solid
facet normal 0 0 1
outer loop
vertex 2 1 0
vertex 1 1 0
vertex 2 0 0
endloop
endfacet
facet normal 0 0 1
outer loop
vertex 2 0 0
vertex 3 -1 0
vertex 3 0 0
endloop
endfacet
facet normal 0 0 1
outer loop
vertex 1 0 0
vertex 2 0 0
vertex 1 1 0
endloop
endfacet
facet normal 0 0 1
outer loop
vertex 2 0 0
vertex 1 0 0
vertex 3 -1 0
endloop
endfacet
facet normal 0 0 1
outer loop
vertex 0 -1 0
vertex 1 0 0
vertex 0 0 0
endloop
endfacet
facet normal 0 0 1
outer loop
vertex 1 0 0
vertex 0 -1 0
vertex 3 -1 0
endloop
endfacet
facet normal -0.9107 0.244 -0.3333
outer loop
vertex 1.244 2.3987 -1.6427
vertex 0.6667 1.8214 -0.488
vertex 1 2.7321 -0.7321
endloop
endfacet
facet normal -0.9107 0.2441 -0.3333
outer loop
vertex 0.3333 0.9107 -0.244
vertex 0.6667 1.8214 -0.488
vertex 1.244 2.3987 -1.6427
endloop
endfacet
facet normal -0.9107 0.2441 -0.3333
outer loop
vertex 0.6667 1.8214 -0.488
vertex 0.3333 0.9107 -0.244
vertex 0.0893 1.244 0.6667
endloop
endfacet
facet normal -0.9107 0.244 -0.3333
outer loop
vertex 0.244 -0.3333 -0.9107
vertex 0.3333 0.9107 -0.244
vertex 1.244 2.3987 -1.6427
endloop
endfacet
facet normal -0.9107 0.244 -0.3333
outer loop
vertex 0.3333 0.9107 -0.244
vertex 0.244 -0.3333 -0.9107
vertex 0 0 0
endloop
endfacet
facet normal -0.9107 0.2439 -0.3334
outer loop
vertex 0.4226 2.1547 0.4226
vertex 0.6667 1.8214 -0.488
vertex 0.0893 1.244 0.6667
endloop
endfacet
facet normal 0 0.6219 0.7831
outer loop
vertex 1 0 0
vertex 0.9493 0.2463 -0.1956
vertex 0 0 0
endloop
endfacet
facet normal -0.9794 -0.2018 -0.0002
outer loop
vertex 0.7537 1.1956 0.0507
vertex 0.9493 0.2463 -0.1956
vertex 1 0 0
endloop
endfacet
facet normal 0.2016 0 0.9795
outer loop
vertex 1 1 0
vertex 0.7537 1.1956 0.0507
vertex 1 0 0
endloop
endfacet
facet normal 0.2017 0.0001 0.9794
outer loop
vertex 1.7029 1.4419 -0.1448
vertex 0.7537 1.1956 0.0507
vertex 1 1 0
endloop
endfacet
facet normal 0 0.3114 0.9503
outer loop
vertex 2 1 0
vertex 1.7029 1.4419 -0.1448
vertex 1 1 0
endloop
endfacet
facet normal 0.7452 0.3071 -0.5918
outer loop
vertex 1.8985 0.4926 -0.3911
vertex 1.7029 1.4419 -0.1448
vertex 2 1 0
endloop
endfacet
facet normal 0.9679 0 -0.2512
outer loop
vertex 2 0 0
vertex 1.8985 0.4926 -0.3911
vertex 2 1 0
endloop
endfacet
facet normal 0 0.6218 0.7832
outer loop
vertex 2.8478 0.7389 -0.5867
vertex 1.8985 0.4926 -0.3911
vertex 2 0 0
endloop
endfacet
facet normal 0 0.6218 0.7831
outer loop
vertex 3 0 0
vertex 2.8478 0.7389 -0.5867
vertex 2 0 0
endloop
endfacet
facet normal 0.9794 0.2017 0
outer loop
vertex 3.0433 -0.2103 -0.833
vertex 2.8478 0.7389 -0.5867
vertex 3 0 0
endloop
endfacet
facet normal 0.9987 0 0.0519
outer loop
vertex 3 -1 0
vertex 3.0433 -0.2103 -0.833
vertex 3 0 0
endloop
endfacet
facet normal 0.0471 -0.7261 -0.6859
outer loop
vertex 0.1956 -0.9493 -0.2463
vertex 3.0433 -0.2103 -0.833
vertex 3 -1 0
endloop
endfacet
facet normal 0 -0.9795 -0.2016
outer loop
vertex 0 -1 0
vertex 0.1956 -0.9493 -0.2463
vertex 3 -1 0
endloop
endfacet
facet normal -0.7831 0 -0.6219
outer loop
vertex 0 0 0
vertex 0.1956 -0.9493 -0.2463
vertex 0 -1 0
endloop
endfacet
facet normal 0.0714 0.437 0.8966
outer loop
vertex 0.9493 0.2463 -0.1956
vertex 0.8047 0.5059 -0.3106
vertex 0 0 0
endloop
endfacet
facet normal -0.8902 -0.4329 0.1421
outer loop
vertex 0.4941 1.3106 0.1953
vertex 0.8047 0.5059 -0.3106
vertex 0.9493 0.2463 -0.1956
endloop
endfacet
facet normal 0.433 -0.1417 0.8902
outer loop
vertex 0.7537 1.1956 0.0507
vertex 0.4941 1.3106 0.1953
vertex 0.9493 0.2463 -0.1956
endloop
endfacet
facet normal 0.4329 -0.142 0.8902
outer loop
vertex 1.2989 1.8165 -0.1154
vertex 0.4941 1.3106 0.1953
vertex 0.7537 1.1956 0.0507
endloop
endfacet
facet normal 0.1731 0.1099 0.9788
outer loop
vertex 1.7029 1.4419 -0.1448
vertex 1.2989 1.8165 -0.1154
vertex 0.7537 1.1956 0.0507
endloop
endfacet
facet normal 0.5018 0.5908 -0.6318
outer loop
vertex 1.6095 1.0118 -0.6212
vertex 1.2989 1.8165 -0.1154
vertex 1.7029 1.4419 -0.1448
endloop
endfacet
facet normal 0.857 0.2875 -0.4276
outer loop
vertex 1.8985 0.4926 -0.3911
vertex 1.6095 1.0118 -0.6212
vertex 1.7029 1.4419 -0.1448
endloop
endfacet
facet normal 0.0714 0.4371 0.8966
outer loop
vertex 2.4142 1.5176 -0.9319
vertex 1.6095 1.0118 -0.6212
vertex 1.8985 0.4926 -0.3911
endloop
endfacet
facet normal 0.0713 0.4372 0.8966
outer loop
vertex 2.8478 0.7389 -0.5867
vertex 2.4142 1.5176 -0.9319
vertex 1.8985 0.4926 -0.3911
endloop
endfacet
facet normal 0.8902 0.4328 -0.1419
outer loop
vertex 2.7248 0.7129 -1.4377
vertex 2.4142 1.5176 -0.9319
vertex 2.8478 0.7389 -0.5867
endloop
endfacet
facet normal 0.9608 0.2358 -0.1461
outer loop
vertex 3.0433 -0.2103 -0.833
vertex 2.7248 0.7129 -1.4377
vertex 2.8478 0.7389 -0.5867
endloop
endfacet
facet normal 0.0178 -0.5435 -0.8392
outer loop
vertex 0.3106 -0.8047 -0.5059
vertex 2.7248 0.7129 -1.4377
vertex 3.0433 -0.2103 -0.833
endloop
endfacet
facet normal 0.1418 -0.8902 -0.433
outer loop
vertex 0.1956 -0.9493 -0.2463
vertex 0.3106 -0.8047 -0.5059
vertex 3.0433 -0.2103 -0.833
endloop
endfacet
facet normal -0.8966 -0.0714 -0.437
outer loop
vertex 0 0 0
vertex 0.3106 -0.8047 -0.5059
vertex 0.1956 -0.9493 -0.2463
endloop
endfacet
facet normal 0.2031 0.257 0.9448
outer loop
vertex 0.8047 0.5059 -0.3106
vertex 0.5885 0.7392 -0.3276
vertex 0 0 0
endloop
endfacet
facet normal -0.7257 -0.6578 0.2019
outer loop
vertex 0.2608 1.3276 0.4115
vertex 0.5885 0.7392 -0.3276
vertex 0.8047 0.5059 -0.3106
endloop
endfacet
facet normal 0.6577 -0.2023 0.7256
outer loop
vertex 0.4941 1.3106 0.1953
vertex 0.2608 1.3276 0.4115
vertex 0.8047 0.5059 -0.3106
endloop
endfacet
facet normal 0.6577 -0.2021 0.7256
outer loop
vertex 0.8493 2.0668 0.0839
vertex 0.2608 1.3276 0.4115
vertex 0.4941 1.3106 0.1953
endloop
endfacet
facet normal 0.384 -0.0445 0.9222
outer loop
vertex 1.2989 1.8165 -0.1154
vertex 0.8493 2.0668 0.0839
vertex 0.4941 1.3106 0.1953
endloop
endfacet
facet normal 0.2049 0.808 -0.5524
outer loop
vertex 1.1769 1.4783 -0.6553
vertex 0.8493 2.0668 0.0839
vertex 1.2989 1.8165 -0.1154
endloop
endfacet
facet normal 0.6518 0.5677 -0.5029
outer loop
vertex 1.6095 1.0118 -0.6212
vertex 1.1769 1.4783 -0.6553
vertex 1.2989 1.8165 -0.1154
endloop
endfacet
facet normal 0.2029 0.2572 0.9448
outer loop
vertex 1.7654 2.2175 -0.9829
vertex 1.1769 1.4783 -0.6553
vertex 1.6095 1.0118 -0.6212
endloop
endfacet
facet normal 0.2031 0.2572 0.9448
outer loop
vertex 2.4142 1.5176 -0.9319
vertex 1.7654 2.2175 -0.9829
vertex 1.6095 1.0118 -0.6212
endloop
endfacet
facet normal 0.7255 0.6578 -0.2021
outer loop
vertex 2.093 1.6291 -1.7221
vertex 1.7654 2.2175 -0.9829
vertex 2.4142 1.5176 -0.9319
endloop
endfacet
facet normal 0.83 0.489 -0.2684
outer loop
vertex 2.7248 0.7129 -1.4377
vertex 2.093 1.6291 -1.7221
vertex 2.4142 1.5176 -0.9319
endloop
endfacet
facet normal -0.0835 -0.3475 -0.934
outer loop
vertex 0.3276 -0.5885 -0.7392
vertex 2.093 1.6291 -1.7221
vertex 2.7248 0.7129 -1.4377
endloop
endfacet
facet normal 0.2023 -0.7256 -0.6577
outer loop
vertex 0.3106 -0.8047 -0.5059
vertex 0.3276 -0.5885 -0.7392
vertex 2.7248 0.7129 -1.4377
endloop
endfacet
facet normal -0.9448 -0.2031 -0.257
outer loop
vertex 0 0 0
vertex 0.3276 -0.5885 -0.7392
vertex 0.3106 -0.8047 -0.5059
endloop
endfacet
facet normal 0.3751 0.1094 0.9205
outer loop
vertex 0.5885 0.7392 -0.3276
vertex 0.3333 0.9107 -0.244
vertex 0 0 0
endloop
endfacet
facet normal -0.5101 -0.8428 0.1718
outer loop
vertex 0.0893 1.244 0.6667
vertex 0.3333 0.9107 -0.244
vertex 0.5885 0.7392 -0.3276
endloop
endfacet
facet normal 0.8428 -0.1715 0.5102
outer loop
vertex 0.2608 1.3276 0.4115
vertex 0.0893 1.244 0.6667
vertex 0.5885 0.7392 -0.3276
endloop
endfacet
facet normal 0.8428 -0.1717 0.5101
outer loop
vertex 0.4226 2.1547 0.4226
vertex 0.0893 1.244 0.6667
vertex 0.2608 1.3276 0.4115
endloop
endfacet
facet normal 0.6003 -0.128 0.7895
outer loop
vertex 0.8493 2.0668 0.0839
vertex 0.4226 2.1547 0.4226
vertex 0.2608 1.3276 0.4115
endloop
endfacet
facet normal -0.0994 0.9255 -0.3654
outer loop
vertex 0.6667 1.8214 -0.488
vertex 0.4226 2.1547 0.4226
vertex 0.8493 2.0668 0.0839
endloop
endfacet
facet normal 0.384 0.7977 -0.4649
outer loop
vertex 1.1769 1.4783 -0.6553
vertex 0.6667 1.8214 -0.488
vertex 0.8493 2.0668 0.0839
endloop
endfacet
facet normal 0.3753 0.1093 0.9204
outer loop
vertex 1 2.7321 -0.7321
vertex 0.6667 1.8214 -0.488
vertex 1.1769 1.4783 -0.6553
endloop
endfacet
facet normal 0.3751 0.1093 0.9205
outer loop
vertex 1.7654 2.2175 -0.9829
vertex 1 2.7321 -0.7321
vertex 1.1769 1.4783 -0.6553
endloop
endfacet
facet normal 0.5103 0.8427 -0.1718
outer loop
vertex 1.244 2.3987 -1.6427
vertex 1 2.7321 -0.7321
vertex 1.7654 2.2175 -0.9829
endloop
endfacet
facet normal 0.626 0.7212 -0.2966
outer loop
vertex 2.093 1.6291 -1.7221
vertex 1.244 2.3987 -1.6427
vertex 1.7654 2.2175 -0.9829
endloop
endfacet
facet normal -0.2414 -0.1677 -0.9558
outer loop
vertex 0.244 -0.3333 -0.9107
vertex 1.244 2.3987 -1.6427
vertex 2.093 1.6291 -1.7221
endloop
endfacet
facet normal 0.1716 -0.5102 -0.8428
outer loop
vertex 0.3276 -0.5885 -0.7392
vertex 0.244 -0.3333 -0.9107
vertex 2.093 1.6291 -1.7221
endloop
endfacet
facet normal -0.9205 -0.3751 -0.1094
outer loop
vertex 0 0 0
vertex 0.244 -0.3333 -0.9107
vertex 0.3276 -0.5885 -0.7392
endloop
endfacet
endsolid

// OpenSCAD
polyhedron(points=[
[0, 0],
[1, 0],
[1, 1],
[2, 1],
[2, 0],
[3, 0],
[3, -1],
[0, -1],
[0.0, 0.0, 0.0],
[0.9492530216741901, 0.24631587185329806, -0.19556889352748996],
[0.7536841281467002, 1.19556889352749, 0.05074697832580988],
[1.702937149820892, 1.441884765380788, -0.14482191520168008],
[1.898506043348382, 0.4926317437065979, -0.3911377870549799],
[2.847759065022572, 0.7389476155598977, -0.5867066805824699],
[3.043327958550062, -0.21030540611429416, -0.8330225524357697],
[0.19556889352748996, -0.9492530216741919, -0.24631587185329984],
[0.0, 0.0, -1.7763568394002505e-15],
[0.8047378541243653, 0.5058793634016787, -0.31061721752604754],
[0.4941206365983195, 1.310617217526044, 0.19526214587563473],
[1.2988584907226848, 1.8164965809277263, -0.11535507165040926],
[1.6094757082487305, 1.011758726803361, -0.6212344350520915],
[2.414213562373096, 1.5176380902050415, -0.9318516525781391],
[2.72483077989914, 0.712900236080678, -1.4377310159798178],
[0.310617217526044, -0.8047378541243653, -0.5058793634016805],
[0.0, 0.0, 0.0],
[0.5884556215767276, 0.7391742860058148, -0.3276299075825406],
[0.26082571399418697, 1.3276299075825406, 0.4115443784232742],
[0.8492813355709128, 2.0668041935883537, 0.08391447084073356],
[1.1769112431534534, 1.4783485720116278, -0.6552598151650812],
[1.7653668647301792, 2.2175228580174426, -0.9828897227476219],
[2.09299677231272, 1.629067236440715, -1.722064008753435],
[0.3276299075825406, -0.5884556215767258, -0.739174286005813],
[0.0, 0.0, -1.7763568394002505e-15],
[0.33333333333333215, 0.9106836025229583, -0.24401693585629403],
[0.0893163974770399, 1.2440169358562922, 0.6666666666666679],
[0.4226497308103738, 2.1547005383792506, 0.4226497308103756],
[0.6666666666666661, 1.8213672050459166, -0.4880338717125863],
[1.0, 2.732050807568875, -0.7320508075688785],
[1.2440169358562905, 2.398717474235543, -1.6427344100918368],
[0.24401693585629047, -0.3333333333333339, -0.9106836025229601],
], faces=[
[0, 1, 2, 3, 4, 5, 6, 7],
[39, 38, 37, 36, 35, 34, 33, 32],
[0, 8, 9],
[0, 9, 1],
[1, 9, 10],
[1, 10, 2],
[2, 10, 11],
[2, 11, 3],
[3, 11, 12],
[3, 12, 4],
[4, 12, 13],
[4, 13, 5],
[5, 13, 14],
[5, 14, 6],
[6, 14, 15],
[6, 15, 7],
[7, 15, 8],
[7, 8, 0],
[8, 16, 17],
[8, 17, 9],
[9, 17, 18],
[9, 18, 10],
[10, 18, 19],
[10, 19, 11],
[11, 19, 20],
[11, 20, 12],
[12, 20, 21],
[12, 21, 13],
[13, 21, 22],
[13, 22, 14],
[14, 22, 23],
[14, 23, 15],
[15, 23, 16],
[15, 16, 8],
[16, 24, 25],
[16, 25, 17],
[17, 25, 26],
[17, 26, 18],
[18, 26, 27],
[18, 27, 19],
[19, 27, 28],
[19, 28, 20],
[20, 28, 29],
[20, 29, 21],
[21, 29, 30],
[21, 30, 22],
[22, 30, 31],
[22, 31, 23],
[23, 31, 24],
[23, 24, 16],
[24, 32, 33],
[24, 33, 25],
[25, 33, 34],
[25, 34, 26],
[26, 34, 35],
[26, 35, 27],
[27, 35, 36],
[27, 36, 28],
[28, 36, 37],
[28, 37, 29],
[29, 37, 38],
[29, 38, 30],
[30, 38, 39],
[30, 39, 31],
[31, 39, 32],
[31, 32, 24],
]);
